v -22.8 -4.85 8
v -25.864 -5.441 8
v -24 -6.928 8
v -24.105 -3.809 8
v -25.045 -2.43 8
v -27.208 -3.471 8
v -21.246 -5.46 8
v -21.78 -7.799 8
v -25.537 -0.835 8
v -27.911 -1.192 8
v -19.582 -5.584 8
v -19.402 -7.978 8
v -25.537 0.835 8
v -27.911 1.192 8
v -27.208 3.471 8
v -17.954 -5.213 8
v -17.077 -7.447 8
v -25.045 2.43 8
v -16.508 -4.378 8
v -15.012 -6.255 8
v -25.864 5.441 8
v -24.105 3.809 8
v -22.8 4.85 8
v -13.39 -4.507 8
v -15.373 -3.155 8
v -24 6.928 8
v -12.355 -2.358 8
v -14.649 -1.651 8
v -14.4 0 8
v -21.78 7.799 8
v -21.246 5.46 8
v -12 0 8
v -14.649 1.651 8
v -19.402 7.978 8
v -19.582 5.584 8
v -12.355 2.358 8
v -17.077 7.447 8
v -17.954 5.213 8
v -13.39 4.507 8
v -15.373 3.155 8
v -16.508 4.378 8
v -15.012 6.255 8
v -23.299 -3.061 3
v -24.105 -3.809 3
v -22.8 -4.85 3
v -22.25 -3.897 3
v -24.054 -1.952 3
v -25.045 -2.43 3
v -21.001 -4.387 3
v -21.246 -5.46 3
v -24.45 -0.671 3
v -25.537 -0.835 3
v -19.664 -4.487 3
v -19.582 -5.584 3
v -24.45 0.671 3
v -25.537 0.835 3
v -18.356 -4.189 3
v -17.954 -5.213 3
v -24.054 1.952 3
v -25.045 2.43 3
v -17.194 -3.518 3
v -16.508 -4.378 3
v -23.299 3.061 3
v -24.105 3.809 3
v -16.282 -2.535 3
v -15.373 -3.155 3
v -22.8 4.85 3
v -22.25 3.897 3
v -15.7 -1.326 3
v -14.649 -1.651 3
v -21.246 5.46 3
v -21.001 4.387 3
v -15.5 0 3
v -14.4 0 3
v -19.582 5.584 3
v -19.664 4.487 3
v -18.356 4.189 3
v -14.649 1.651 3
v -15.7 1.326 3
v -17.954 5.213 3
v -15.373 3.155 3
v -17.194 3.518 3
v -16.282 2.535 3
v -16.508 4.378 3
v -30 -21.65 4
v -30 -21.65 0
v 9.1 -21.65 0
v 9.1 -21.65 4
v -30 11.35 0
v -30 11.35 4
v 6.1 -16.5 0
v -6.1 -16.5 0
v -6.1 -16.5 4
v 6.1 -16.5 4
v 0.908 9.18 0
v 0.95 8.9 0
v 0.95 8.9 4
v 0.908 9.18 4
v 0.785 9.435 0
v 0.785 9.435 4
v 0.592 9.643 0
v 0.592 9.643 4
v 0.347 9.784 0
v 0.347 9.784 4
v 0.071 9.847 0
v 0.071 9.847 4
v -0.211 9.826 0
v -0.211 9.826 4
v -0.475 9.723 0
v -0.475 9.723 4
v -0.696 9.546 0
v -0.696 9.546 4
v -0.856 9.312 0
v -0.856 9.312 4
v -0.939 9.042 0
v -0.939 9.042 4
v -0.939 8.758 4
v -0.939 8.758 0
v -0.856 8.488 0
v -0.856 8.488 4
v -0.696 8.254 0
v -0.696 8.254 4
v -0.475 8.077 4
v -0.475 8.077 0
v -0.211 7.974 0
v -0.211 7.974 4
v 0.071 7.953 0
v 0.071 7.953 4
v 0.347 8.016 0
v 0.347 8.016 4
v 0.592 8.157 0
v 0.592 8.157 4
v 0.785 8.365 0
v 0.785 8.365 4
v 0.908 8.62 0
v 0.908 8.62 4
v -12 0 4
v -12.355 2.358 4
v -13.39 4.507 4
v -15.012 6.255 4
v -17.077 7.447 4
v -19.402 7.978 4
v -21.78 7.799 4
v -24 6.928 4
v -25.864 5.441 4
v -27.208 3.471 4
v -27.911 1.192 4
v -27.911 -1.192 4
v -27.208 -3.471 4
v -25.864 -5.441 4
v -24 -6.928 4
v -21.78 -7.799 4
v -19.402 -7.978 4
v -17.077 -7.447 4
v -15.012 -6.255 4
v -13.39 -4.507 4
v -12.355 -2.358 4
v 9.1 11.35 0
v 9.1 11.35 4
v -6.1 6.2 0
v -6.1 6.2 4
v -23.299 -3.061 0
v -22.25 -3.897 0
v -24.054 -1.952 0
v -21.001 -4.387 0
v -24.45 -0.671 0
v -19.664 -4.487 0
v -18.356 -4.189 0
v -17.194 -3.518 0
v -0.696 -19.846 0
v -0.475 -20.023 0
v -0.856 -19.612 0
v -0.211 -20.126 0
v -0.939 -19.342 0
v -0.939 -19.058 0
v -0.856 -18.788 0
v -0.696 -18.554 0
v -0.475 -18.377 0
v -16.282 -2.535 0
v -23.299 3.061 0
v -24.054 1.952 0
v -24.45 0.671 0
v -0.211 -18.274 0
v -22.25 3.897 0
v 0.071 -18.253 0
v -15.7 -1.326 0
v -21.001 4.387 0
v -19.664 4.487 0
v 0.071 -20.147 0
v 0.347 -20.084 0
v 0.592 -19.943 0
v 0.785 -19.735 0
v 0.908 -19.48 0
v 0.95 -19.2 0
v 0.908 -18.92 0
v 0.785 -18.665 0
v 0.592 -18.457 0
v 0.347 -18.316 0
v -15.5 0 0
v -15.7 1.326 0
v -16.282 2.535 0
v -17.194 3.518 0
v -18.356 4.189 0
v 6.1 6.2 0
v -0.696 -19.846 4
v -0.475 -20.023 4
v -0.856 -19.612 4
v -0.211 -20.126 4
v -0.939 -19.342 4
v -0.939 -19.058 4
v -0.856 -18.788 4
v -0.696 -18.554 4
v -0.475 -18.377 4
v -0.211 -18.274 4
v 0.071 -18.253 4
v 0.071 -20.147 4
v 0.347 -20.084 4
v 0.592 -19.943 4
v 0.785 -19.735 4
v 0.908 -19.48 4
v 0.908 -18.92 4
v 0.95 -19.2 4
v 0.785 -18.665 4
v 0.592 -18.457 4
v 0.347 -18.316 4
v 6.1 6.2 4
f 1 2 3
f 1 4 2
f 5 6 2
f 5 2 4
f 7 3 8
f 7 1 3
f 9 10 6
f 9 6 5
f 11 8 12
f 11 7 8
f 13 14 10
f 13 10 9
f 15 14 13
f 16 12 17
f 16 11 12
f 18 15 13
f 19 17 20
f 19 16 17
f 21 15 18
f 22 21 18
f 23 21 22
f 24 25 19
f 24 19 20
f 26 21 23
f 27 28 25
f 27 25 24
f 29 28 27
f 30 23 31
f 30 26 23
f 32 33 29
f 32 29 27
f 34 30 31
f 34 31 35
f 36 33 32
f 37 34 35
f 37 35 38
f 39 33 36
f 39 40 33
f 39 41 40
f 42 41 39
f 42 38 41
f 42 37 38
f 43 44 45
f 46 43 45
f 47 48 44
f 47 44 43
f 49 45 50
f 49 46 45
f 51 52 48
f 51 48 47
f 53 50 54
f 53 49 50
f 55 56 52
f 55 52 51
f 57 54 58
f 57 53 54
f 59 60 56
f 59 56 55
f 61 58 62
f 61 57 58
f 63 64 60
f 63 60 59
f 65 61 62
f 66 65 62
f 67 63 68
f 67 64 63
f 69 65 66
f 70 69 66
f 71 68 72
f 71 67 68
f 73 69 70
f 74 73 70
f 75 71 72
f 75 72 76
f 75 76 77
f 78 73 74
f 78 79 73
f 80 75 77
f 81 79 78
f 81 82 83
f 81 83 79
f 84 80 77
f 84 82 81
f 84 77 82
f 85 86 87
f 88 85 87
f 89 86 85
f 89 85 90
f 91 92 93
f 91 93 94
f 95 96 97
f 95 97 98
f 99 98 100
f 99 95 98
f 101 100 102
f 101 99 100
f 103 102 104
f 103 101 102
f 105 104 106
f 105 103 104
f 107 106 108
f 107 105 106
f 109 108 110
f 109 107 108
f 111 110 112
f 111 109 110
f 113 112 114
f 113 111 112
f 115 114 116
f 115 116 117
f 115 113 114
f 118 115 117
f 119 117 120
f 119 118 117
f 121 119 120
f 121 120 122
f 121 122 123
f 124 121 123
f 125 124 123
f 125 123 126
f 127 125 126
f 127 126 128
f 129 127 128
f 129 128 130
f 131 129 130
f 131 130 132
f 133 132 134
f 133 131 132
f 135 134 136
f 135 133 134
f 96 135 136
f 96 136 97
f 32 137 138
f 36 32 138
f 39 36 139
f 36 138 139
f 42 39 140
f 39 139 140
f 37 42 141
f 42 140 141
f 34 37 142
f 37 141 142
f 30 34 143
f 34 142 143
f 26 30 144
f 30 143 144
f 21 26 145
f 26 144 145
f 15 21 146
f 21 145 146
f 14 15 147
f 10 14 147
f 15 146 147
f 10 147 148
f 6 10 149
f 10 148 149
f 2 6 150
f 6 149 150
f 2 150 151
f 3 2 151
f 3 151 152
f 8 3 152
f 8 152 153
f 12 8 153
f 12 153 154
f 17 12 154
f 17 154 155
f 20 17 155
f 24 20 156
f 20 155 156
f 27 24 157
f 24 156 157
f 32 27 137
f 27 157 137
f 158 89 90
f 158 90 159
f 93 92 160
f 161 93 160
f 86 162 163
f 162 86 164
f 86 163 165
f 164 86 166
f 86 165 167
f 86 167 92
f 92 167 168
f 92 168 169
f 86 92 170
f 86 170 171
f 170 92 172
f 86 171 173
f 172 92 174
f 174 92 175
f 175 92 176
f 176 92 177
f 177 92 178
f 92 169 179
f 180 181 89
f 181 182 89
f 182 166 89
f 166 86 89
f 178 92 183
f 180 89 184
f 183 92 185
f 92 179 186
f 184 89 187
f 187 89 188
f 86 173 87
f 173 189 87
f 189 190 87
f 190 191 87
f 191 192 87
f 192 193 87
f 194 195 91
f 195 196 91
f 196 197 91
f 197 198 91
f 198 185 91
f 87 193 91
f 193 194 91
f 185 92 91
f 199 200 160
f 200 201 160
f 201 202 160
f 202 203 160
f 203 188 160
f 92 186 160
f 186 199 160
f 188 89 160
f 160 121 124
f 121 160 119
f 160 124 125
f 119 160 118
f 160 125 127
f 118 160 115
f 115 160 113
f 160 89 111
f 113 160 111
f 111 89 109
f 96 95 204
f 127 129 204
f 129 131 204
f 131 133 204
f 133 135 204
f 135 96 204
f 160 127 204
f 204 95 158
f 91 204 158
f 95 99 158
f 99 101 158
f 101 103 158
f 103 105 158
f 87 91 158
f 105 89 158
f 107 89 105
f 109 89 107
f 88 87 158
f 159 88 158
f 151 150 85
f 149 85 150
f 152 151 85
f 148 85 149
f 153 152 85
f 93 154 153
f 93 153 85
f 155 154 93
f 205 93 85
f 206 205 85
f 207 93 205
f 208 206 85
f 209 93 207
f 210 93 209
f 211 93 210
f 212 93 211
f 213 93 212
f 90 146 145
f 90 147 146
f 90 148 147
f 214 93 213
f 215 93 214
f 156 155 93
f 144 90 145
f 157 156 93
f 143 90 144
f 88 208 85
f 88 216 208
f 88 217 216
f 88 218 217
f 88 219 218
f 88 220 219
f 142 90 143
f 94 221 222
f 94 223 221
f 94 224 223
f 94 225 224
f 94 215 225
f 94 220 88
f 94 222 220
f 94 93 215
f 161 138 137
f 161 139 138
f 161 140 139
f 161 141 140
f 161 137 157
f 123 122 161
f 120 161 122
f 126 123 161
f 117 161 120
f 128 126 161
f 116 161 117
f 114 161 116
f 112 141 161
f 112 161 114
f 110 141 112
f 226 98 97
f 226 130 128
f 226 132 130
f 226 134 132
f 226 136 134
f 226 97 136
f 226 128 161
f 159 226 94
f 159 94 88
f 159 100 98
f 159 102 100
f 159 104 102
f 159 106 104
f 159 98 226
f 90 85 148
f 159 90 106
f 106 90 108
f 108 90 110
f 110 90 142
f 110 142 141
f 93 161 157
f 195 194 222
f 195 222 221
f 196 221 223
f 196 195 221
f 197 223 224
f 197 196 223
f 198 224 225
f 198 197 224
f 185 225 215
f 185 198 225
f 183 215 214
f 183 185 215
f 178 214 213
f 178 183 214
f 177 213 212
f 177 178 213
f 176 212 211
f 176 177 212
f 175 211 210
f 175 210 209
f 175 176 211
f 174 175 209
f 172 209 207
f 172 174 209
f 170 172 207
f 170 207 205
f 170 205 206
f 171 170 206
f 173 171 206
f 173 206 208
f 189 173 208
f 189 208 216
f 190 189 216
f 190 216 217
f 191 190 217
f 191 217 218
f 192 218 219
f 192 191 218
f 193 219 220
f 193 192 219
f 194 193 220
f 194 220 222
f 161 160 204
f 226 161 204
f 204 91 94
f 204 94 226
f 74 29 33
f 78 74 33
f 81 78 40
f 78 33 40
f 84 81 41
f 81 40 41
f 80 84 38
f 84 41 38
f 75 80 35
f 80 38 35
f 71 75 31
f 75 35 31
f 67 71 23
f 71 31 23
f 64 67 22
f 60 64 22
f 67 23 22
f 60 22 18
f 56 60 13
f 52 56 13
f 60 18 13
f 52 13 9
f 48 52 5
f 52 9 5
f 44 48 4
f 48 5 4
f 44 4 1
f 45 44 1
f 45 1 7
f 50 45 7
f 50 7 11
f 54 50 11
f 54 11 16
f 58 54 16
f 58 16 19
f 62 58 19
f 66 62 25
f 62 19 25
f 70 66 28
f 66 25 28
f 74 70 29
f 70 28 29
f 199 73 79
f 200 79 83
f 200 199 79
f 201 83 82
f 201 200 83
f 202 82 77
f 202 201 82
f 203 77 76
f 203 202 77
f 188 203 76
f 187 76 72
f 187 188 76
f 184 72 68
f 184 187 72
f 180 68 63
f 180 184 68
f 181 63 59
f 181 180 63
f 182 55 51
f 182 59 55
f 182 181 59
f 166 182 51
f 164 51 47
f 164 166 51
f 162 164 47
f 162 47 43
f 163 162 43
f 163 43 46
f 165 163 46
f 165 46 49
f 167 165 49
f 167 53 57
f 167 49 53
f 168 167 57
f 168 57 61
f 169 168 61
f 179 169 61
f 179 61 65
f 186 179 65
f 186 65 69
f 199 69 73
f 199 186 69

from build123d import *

# Parameters (mm, degrees)
SKETCH1_W           = 39.1
SKETCH1_H           = 33
SKETCH1_R           = 0.95
SKETCH1_R_2         = 4.5
SKETCH1_W_2         = 12.2
SKETCH1_H_2         = 22.7
BOSS_EXTRUDE1_DEPTH = 4
BOSS_EXTRUDE2_START = 4
SKETCH2_R           = 8
SKETCH2_R_2         = 4.403773093
BOSS_EXTRUDE2_DEPTH = 4
CUT_EXTRUDE1_START  = 8
SKETCH3_R           = 5.6
CUT_EXTRUDE1_DEPTH  = 5


with BuildPart() as part:
    # Sketch1 → Boss-Extrude1 (new body)
    with BuildSketch(Plane.XY):
        with Locations((-10.45, -5.15)):
            Rectangle(SKETCH1_W, SKETCH1_H)
        with Locations((0, 8.9)):
            Circle(SKETCH1_R, mode=Mode.SUBTRACT)
        with Locations((0, -19.2)):
            Circle(SKETCH1_R, mode=Mode.SUBTRACT)
        with Locations((-20, 0)):
            Circle(SKETCH1_R_2, mode=Mode.SUBTRACT)
        with Locations((0, -5.15)):
            Rectangle(SKETCH1_W_2, SKETCH1_H_2, mode=Mode.SUBTRACT)
    extrude(amount=BOSS_EXTRUDE1_DEPTH)

    # Sketch2 → Boss-Extrude2 (add)
    with BuildSketch(Plane.XY.offset(BOSS_EXTRUDE2_START)):
        with Locations((-20, 0)):
            Circle(SKETCH2_R)
        with Locations((-20, 0)):
            Circle(SKETCH2_R_2, mode=Mode.SUBTRACT)
    extrude(amount=BOSS_EXTRUDE2_DEPTH)

    # Sketch3 → Cut-Extrude1 (cut)
    with BuildSketch(Plane.XY.offset(CUT_EXTRUDE1_START)):
        with Locations((-20, 0)):
            Circle(SKETCH3_R)
    extrude(amount=-CUT_EXTRUDE1_DEPTH, mode=Mode.SUBTRACT)


solid = part.part
